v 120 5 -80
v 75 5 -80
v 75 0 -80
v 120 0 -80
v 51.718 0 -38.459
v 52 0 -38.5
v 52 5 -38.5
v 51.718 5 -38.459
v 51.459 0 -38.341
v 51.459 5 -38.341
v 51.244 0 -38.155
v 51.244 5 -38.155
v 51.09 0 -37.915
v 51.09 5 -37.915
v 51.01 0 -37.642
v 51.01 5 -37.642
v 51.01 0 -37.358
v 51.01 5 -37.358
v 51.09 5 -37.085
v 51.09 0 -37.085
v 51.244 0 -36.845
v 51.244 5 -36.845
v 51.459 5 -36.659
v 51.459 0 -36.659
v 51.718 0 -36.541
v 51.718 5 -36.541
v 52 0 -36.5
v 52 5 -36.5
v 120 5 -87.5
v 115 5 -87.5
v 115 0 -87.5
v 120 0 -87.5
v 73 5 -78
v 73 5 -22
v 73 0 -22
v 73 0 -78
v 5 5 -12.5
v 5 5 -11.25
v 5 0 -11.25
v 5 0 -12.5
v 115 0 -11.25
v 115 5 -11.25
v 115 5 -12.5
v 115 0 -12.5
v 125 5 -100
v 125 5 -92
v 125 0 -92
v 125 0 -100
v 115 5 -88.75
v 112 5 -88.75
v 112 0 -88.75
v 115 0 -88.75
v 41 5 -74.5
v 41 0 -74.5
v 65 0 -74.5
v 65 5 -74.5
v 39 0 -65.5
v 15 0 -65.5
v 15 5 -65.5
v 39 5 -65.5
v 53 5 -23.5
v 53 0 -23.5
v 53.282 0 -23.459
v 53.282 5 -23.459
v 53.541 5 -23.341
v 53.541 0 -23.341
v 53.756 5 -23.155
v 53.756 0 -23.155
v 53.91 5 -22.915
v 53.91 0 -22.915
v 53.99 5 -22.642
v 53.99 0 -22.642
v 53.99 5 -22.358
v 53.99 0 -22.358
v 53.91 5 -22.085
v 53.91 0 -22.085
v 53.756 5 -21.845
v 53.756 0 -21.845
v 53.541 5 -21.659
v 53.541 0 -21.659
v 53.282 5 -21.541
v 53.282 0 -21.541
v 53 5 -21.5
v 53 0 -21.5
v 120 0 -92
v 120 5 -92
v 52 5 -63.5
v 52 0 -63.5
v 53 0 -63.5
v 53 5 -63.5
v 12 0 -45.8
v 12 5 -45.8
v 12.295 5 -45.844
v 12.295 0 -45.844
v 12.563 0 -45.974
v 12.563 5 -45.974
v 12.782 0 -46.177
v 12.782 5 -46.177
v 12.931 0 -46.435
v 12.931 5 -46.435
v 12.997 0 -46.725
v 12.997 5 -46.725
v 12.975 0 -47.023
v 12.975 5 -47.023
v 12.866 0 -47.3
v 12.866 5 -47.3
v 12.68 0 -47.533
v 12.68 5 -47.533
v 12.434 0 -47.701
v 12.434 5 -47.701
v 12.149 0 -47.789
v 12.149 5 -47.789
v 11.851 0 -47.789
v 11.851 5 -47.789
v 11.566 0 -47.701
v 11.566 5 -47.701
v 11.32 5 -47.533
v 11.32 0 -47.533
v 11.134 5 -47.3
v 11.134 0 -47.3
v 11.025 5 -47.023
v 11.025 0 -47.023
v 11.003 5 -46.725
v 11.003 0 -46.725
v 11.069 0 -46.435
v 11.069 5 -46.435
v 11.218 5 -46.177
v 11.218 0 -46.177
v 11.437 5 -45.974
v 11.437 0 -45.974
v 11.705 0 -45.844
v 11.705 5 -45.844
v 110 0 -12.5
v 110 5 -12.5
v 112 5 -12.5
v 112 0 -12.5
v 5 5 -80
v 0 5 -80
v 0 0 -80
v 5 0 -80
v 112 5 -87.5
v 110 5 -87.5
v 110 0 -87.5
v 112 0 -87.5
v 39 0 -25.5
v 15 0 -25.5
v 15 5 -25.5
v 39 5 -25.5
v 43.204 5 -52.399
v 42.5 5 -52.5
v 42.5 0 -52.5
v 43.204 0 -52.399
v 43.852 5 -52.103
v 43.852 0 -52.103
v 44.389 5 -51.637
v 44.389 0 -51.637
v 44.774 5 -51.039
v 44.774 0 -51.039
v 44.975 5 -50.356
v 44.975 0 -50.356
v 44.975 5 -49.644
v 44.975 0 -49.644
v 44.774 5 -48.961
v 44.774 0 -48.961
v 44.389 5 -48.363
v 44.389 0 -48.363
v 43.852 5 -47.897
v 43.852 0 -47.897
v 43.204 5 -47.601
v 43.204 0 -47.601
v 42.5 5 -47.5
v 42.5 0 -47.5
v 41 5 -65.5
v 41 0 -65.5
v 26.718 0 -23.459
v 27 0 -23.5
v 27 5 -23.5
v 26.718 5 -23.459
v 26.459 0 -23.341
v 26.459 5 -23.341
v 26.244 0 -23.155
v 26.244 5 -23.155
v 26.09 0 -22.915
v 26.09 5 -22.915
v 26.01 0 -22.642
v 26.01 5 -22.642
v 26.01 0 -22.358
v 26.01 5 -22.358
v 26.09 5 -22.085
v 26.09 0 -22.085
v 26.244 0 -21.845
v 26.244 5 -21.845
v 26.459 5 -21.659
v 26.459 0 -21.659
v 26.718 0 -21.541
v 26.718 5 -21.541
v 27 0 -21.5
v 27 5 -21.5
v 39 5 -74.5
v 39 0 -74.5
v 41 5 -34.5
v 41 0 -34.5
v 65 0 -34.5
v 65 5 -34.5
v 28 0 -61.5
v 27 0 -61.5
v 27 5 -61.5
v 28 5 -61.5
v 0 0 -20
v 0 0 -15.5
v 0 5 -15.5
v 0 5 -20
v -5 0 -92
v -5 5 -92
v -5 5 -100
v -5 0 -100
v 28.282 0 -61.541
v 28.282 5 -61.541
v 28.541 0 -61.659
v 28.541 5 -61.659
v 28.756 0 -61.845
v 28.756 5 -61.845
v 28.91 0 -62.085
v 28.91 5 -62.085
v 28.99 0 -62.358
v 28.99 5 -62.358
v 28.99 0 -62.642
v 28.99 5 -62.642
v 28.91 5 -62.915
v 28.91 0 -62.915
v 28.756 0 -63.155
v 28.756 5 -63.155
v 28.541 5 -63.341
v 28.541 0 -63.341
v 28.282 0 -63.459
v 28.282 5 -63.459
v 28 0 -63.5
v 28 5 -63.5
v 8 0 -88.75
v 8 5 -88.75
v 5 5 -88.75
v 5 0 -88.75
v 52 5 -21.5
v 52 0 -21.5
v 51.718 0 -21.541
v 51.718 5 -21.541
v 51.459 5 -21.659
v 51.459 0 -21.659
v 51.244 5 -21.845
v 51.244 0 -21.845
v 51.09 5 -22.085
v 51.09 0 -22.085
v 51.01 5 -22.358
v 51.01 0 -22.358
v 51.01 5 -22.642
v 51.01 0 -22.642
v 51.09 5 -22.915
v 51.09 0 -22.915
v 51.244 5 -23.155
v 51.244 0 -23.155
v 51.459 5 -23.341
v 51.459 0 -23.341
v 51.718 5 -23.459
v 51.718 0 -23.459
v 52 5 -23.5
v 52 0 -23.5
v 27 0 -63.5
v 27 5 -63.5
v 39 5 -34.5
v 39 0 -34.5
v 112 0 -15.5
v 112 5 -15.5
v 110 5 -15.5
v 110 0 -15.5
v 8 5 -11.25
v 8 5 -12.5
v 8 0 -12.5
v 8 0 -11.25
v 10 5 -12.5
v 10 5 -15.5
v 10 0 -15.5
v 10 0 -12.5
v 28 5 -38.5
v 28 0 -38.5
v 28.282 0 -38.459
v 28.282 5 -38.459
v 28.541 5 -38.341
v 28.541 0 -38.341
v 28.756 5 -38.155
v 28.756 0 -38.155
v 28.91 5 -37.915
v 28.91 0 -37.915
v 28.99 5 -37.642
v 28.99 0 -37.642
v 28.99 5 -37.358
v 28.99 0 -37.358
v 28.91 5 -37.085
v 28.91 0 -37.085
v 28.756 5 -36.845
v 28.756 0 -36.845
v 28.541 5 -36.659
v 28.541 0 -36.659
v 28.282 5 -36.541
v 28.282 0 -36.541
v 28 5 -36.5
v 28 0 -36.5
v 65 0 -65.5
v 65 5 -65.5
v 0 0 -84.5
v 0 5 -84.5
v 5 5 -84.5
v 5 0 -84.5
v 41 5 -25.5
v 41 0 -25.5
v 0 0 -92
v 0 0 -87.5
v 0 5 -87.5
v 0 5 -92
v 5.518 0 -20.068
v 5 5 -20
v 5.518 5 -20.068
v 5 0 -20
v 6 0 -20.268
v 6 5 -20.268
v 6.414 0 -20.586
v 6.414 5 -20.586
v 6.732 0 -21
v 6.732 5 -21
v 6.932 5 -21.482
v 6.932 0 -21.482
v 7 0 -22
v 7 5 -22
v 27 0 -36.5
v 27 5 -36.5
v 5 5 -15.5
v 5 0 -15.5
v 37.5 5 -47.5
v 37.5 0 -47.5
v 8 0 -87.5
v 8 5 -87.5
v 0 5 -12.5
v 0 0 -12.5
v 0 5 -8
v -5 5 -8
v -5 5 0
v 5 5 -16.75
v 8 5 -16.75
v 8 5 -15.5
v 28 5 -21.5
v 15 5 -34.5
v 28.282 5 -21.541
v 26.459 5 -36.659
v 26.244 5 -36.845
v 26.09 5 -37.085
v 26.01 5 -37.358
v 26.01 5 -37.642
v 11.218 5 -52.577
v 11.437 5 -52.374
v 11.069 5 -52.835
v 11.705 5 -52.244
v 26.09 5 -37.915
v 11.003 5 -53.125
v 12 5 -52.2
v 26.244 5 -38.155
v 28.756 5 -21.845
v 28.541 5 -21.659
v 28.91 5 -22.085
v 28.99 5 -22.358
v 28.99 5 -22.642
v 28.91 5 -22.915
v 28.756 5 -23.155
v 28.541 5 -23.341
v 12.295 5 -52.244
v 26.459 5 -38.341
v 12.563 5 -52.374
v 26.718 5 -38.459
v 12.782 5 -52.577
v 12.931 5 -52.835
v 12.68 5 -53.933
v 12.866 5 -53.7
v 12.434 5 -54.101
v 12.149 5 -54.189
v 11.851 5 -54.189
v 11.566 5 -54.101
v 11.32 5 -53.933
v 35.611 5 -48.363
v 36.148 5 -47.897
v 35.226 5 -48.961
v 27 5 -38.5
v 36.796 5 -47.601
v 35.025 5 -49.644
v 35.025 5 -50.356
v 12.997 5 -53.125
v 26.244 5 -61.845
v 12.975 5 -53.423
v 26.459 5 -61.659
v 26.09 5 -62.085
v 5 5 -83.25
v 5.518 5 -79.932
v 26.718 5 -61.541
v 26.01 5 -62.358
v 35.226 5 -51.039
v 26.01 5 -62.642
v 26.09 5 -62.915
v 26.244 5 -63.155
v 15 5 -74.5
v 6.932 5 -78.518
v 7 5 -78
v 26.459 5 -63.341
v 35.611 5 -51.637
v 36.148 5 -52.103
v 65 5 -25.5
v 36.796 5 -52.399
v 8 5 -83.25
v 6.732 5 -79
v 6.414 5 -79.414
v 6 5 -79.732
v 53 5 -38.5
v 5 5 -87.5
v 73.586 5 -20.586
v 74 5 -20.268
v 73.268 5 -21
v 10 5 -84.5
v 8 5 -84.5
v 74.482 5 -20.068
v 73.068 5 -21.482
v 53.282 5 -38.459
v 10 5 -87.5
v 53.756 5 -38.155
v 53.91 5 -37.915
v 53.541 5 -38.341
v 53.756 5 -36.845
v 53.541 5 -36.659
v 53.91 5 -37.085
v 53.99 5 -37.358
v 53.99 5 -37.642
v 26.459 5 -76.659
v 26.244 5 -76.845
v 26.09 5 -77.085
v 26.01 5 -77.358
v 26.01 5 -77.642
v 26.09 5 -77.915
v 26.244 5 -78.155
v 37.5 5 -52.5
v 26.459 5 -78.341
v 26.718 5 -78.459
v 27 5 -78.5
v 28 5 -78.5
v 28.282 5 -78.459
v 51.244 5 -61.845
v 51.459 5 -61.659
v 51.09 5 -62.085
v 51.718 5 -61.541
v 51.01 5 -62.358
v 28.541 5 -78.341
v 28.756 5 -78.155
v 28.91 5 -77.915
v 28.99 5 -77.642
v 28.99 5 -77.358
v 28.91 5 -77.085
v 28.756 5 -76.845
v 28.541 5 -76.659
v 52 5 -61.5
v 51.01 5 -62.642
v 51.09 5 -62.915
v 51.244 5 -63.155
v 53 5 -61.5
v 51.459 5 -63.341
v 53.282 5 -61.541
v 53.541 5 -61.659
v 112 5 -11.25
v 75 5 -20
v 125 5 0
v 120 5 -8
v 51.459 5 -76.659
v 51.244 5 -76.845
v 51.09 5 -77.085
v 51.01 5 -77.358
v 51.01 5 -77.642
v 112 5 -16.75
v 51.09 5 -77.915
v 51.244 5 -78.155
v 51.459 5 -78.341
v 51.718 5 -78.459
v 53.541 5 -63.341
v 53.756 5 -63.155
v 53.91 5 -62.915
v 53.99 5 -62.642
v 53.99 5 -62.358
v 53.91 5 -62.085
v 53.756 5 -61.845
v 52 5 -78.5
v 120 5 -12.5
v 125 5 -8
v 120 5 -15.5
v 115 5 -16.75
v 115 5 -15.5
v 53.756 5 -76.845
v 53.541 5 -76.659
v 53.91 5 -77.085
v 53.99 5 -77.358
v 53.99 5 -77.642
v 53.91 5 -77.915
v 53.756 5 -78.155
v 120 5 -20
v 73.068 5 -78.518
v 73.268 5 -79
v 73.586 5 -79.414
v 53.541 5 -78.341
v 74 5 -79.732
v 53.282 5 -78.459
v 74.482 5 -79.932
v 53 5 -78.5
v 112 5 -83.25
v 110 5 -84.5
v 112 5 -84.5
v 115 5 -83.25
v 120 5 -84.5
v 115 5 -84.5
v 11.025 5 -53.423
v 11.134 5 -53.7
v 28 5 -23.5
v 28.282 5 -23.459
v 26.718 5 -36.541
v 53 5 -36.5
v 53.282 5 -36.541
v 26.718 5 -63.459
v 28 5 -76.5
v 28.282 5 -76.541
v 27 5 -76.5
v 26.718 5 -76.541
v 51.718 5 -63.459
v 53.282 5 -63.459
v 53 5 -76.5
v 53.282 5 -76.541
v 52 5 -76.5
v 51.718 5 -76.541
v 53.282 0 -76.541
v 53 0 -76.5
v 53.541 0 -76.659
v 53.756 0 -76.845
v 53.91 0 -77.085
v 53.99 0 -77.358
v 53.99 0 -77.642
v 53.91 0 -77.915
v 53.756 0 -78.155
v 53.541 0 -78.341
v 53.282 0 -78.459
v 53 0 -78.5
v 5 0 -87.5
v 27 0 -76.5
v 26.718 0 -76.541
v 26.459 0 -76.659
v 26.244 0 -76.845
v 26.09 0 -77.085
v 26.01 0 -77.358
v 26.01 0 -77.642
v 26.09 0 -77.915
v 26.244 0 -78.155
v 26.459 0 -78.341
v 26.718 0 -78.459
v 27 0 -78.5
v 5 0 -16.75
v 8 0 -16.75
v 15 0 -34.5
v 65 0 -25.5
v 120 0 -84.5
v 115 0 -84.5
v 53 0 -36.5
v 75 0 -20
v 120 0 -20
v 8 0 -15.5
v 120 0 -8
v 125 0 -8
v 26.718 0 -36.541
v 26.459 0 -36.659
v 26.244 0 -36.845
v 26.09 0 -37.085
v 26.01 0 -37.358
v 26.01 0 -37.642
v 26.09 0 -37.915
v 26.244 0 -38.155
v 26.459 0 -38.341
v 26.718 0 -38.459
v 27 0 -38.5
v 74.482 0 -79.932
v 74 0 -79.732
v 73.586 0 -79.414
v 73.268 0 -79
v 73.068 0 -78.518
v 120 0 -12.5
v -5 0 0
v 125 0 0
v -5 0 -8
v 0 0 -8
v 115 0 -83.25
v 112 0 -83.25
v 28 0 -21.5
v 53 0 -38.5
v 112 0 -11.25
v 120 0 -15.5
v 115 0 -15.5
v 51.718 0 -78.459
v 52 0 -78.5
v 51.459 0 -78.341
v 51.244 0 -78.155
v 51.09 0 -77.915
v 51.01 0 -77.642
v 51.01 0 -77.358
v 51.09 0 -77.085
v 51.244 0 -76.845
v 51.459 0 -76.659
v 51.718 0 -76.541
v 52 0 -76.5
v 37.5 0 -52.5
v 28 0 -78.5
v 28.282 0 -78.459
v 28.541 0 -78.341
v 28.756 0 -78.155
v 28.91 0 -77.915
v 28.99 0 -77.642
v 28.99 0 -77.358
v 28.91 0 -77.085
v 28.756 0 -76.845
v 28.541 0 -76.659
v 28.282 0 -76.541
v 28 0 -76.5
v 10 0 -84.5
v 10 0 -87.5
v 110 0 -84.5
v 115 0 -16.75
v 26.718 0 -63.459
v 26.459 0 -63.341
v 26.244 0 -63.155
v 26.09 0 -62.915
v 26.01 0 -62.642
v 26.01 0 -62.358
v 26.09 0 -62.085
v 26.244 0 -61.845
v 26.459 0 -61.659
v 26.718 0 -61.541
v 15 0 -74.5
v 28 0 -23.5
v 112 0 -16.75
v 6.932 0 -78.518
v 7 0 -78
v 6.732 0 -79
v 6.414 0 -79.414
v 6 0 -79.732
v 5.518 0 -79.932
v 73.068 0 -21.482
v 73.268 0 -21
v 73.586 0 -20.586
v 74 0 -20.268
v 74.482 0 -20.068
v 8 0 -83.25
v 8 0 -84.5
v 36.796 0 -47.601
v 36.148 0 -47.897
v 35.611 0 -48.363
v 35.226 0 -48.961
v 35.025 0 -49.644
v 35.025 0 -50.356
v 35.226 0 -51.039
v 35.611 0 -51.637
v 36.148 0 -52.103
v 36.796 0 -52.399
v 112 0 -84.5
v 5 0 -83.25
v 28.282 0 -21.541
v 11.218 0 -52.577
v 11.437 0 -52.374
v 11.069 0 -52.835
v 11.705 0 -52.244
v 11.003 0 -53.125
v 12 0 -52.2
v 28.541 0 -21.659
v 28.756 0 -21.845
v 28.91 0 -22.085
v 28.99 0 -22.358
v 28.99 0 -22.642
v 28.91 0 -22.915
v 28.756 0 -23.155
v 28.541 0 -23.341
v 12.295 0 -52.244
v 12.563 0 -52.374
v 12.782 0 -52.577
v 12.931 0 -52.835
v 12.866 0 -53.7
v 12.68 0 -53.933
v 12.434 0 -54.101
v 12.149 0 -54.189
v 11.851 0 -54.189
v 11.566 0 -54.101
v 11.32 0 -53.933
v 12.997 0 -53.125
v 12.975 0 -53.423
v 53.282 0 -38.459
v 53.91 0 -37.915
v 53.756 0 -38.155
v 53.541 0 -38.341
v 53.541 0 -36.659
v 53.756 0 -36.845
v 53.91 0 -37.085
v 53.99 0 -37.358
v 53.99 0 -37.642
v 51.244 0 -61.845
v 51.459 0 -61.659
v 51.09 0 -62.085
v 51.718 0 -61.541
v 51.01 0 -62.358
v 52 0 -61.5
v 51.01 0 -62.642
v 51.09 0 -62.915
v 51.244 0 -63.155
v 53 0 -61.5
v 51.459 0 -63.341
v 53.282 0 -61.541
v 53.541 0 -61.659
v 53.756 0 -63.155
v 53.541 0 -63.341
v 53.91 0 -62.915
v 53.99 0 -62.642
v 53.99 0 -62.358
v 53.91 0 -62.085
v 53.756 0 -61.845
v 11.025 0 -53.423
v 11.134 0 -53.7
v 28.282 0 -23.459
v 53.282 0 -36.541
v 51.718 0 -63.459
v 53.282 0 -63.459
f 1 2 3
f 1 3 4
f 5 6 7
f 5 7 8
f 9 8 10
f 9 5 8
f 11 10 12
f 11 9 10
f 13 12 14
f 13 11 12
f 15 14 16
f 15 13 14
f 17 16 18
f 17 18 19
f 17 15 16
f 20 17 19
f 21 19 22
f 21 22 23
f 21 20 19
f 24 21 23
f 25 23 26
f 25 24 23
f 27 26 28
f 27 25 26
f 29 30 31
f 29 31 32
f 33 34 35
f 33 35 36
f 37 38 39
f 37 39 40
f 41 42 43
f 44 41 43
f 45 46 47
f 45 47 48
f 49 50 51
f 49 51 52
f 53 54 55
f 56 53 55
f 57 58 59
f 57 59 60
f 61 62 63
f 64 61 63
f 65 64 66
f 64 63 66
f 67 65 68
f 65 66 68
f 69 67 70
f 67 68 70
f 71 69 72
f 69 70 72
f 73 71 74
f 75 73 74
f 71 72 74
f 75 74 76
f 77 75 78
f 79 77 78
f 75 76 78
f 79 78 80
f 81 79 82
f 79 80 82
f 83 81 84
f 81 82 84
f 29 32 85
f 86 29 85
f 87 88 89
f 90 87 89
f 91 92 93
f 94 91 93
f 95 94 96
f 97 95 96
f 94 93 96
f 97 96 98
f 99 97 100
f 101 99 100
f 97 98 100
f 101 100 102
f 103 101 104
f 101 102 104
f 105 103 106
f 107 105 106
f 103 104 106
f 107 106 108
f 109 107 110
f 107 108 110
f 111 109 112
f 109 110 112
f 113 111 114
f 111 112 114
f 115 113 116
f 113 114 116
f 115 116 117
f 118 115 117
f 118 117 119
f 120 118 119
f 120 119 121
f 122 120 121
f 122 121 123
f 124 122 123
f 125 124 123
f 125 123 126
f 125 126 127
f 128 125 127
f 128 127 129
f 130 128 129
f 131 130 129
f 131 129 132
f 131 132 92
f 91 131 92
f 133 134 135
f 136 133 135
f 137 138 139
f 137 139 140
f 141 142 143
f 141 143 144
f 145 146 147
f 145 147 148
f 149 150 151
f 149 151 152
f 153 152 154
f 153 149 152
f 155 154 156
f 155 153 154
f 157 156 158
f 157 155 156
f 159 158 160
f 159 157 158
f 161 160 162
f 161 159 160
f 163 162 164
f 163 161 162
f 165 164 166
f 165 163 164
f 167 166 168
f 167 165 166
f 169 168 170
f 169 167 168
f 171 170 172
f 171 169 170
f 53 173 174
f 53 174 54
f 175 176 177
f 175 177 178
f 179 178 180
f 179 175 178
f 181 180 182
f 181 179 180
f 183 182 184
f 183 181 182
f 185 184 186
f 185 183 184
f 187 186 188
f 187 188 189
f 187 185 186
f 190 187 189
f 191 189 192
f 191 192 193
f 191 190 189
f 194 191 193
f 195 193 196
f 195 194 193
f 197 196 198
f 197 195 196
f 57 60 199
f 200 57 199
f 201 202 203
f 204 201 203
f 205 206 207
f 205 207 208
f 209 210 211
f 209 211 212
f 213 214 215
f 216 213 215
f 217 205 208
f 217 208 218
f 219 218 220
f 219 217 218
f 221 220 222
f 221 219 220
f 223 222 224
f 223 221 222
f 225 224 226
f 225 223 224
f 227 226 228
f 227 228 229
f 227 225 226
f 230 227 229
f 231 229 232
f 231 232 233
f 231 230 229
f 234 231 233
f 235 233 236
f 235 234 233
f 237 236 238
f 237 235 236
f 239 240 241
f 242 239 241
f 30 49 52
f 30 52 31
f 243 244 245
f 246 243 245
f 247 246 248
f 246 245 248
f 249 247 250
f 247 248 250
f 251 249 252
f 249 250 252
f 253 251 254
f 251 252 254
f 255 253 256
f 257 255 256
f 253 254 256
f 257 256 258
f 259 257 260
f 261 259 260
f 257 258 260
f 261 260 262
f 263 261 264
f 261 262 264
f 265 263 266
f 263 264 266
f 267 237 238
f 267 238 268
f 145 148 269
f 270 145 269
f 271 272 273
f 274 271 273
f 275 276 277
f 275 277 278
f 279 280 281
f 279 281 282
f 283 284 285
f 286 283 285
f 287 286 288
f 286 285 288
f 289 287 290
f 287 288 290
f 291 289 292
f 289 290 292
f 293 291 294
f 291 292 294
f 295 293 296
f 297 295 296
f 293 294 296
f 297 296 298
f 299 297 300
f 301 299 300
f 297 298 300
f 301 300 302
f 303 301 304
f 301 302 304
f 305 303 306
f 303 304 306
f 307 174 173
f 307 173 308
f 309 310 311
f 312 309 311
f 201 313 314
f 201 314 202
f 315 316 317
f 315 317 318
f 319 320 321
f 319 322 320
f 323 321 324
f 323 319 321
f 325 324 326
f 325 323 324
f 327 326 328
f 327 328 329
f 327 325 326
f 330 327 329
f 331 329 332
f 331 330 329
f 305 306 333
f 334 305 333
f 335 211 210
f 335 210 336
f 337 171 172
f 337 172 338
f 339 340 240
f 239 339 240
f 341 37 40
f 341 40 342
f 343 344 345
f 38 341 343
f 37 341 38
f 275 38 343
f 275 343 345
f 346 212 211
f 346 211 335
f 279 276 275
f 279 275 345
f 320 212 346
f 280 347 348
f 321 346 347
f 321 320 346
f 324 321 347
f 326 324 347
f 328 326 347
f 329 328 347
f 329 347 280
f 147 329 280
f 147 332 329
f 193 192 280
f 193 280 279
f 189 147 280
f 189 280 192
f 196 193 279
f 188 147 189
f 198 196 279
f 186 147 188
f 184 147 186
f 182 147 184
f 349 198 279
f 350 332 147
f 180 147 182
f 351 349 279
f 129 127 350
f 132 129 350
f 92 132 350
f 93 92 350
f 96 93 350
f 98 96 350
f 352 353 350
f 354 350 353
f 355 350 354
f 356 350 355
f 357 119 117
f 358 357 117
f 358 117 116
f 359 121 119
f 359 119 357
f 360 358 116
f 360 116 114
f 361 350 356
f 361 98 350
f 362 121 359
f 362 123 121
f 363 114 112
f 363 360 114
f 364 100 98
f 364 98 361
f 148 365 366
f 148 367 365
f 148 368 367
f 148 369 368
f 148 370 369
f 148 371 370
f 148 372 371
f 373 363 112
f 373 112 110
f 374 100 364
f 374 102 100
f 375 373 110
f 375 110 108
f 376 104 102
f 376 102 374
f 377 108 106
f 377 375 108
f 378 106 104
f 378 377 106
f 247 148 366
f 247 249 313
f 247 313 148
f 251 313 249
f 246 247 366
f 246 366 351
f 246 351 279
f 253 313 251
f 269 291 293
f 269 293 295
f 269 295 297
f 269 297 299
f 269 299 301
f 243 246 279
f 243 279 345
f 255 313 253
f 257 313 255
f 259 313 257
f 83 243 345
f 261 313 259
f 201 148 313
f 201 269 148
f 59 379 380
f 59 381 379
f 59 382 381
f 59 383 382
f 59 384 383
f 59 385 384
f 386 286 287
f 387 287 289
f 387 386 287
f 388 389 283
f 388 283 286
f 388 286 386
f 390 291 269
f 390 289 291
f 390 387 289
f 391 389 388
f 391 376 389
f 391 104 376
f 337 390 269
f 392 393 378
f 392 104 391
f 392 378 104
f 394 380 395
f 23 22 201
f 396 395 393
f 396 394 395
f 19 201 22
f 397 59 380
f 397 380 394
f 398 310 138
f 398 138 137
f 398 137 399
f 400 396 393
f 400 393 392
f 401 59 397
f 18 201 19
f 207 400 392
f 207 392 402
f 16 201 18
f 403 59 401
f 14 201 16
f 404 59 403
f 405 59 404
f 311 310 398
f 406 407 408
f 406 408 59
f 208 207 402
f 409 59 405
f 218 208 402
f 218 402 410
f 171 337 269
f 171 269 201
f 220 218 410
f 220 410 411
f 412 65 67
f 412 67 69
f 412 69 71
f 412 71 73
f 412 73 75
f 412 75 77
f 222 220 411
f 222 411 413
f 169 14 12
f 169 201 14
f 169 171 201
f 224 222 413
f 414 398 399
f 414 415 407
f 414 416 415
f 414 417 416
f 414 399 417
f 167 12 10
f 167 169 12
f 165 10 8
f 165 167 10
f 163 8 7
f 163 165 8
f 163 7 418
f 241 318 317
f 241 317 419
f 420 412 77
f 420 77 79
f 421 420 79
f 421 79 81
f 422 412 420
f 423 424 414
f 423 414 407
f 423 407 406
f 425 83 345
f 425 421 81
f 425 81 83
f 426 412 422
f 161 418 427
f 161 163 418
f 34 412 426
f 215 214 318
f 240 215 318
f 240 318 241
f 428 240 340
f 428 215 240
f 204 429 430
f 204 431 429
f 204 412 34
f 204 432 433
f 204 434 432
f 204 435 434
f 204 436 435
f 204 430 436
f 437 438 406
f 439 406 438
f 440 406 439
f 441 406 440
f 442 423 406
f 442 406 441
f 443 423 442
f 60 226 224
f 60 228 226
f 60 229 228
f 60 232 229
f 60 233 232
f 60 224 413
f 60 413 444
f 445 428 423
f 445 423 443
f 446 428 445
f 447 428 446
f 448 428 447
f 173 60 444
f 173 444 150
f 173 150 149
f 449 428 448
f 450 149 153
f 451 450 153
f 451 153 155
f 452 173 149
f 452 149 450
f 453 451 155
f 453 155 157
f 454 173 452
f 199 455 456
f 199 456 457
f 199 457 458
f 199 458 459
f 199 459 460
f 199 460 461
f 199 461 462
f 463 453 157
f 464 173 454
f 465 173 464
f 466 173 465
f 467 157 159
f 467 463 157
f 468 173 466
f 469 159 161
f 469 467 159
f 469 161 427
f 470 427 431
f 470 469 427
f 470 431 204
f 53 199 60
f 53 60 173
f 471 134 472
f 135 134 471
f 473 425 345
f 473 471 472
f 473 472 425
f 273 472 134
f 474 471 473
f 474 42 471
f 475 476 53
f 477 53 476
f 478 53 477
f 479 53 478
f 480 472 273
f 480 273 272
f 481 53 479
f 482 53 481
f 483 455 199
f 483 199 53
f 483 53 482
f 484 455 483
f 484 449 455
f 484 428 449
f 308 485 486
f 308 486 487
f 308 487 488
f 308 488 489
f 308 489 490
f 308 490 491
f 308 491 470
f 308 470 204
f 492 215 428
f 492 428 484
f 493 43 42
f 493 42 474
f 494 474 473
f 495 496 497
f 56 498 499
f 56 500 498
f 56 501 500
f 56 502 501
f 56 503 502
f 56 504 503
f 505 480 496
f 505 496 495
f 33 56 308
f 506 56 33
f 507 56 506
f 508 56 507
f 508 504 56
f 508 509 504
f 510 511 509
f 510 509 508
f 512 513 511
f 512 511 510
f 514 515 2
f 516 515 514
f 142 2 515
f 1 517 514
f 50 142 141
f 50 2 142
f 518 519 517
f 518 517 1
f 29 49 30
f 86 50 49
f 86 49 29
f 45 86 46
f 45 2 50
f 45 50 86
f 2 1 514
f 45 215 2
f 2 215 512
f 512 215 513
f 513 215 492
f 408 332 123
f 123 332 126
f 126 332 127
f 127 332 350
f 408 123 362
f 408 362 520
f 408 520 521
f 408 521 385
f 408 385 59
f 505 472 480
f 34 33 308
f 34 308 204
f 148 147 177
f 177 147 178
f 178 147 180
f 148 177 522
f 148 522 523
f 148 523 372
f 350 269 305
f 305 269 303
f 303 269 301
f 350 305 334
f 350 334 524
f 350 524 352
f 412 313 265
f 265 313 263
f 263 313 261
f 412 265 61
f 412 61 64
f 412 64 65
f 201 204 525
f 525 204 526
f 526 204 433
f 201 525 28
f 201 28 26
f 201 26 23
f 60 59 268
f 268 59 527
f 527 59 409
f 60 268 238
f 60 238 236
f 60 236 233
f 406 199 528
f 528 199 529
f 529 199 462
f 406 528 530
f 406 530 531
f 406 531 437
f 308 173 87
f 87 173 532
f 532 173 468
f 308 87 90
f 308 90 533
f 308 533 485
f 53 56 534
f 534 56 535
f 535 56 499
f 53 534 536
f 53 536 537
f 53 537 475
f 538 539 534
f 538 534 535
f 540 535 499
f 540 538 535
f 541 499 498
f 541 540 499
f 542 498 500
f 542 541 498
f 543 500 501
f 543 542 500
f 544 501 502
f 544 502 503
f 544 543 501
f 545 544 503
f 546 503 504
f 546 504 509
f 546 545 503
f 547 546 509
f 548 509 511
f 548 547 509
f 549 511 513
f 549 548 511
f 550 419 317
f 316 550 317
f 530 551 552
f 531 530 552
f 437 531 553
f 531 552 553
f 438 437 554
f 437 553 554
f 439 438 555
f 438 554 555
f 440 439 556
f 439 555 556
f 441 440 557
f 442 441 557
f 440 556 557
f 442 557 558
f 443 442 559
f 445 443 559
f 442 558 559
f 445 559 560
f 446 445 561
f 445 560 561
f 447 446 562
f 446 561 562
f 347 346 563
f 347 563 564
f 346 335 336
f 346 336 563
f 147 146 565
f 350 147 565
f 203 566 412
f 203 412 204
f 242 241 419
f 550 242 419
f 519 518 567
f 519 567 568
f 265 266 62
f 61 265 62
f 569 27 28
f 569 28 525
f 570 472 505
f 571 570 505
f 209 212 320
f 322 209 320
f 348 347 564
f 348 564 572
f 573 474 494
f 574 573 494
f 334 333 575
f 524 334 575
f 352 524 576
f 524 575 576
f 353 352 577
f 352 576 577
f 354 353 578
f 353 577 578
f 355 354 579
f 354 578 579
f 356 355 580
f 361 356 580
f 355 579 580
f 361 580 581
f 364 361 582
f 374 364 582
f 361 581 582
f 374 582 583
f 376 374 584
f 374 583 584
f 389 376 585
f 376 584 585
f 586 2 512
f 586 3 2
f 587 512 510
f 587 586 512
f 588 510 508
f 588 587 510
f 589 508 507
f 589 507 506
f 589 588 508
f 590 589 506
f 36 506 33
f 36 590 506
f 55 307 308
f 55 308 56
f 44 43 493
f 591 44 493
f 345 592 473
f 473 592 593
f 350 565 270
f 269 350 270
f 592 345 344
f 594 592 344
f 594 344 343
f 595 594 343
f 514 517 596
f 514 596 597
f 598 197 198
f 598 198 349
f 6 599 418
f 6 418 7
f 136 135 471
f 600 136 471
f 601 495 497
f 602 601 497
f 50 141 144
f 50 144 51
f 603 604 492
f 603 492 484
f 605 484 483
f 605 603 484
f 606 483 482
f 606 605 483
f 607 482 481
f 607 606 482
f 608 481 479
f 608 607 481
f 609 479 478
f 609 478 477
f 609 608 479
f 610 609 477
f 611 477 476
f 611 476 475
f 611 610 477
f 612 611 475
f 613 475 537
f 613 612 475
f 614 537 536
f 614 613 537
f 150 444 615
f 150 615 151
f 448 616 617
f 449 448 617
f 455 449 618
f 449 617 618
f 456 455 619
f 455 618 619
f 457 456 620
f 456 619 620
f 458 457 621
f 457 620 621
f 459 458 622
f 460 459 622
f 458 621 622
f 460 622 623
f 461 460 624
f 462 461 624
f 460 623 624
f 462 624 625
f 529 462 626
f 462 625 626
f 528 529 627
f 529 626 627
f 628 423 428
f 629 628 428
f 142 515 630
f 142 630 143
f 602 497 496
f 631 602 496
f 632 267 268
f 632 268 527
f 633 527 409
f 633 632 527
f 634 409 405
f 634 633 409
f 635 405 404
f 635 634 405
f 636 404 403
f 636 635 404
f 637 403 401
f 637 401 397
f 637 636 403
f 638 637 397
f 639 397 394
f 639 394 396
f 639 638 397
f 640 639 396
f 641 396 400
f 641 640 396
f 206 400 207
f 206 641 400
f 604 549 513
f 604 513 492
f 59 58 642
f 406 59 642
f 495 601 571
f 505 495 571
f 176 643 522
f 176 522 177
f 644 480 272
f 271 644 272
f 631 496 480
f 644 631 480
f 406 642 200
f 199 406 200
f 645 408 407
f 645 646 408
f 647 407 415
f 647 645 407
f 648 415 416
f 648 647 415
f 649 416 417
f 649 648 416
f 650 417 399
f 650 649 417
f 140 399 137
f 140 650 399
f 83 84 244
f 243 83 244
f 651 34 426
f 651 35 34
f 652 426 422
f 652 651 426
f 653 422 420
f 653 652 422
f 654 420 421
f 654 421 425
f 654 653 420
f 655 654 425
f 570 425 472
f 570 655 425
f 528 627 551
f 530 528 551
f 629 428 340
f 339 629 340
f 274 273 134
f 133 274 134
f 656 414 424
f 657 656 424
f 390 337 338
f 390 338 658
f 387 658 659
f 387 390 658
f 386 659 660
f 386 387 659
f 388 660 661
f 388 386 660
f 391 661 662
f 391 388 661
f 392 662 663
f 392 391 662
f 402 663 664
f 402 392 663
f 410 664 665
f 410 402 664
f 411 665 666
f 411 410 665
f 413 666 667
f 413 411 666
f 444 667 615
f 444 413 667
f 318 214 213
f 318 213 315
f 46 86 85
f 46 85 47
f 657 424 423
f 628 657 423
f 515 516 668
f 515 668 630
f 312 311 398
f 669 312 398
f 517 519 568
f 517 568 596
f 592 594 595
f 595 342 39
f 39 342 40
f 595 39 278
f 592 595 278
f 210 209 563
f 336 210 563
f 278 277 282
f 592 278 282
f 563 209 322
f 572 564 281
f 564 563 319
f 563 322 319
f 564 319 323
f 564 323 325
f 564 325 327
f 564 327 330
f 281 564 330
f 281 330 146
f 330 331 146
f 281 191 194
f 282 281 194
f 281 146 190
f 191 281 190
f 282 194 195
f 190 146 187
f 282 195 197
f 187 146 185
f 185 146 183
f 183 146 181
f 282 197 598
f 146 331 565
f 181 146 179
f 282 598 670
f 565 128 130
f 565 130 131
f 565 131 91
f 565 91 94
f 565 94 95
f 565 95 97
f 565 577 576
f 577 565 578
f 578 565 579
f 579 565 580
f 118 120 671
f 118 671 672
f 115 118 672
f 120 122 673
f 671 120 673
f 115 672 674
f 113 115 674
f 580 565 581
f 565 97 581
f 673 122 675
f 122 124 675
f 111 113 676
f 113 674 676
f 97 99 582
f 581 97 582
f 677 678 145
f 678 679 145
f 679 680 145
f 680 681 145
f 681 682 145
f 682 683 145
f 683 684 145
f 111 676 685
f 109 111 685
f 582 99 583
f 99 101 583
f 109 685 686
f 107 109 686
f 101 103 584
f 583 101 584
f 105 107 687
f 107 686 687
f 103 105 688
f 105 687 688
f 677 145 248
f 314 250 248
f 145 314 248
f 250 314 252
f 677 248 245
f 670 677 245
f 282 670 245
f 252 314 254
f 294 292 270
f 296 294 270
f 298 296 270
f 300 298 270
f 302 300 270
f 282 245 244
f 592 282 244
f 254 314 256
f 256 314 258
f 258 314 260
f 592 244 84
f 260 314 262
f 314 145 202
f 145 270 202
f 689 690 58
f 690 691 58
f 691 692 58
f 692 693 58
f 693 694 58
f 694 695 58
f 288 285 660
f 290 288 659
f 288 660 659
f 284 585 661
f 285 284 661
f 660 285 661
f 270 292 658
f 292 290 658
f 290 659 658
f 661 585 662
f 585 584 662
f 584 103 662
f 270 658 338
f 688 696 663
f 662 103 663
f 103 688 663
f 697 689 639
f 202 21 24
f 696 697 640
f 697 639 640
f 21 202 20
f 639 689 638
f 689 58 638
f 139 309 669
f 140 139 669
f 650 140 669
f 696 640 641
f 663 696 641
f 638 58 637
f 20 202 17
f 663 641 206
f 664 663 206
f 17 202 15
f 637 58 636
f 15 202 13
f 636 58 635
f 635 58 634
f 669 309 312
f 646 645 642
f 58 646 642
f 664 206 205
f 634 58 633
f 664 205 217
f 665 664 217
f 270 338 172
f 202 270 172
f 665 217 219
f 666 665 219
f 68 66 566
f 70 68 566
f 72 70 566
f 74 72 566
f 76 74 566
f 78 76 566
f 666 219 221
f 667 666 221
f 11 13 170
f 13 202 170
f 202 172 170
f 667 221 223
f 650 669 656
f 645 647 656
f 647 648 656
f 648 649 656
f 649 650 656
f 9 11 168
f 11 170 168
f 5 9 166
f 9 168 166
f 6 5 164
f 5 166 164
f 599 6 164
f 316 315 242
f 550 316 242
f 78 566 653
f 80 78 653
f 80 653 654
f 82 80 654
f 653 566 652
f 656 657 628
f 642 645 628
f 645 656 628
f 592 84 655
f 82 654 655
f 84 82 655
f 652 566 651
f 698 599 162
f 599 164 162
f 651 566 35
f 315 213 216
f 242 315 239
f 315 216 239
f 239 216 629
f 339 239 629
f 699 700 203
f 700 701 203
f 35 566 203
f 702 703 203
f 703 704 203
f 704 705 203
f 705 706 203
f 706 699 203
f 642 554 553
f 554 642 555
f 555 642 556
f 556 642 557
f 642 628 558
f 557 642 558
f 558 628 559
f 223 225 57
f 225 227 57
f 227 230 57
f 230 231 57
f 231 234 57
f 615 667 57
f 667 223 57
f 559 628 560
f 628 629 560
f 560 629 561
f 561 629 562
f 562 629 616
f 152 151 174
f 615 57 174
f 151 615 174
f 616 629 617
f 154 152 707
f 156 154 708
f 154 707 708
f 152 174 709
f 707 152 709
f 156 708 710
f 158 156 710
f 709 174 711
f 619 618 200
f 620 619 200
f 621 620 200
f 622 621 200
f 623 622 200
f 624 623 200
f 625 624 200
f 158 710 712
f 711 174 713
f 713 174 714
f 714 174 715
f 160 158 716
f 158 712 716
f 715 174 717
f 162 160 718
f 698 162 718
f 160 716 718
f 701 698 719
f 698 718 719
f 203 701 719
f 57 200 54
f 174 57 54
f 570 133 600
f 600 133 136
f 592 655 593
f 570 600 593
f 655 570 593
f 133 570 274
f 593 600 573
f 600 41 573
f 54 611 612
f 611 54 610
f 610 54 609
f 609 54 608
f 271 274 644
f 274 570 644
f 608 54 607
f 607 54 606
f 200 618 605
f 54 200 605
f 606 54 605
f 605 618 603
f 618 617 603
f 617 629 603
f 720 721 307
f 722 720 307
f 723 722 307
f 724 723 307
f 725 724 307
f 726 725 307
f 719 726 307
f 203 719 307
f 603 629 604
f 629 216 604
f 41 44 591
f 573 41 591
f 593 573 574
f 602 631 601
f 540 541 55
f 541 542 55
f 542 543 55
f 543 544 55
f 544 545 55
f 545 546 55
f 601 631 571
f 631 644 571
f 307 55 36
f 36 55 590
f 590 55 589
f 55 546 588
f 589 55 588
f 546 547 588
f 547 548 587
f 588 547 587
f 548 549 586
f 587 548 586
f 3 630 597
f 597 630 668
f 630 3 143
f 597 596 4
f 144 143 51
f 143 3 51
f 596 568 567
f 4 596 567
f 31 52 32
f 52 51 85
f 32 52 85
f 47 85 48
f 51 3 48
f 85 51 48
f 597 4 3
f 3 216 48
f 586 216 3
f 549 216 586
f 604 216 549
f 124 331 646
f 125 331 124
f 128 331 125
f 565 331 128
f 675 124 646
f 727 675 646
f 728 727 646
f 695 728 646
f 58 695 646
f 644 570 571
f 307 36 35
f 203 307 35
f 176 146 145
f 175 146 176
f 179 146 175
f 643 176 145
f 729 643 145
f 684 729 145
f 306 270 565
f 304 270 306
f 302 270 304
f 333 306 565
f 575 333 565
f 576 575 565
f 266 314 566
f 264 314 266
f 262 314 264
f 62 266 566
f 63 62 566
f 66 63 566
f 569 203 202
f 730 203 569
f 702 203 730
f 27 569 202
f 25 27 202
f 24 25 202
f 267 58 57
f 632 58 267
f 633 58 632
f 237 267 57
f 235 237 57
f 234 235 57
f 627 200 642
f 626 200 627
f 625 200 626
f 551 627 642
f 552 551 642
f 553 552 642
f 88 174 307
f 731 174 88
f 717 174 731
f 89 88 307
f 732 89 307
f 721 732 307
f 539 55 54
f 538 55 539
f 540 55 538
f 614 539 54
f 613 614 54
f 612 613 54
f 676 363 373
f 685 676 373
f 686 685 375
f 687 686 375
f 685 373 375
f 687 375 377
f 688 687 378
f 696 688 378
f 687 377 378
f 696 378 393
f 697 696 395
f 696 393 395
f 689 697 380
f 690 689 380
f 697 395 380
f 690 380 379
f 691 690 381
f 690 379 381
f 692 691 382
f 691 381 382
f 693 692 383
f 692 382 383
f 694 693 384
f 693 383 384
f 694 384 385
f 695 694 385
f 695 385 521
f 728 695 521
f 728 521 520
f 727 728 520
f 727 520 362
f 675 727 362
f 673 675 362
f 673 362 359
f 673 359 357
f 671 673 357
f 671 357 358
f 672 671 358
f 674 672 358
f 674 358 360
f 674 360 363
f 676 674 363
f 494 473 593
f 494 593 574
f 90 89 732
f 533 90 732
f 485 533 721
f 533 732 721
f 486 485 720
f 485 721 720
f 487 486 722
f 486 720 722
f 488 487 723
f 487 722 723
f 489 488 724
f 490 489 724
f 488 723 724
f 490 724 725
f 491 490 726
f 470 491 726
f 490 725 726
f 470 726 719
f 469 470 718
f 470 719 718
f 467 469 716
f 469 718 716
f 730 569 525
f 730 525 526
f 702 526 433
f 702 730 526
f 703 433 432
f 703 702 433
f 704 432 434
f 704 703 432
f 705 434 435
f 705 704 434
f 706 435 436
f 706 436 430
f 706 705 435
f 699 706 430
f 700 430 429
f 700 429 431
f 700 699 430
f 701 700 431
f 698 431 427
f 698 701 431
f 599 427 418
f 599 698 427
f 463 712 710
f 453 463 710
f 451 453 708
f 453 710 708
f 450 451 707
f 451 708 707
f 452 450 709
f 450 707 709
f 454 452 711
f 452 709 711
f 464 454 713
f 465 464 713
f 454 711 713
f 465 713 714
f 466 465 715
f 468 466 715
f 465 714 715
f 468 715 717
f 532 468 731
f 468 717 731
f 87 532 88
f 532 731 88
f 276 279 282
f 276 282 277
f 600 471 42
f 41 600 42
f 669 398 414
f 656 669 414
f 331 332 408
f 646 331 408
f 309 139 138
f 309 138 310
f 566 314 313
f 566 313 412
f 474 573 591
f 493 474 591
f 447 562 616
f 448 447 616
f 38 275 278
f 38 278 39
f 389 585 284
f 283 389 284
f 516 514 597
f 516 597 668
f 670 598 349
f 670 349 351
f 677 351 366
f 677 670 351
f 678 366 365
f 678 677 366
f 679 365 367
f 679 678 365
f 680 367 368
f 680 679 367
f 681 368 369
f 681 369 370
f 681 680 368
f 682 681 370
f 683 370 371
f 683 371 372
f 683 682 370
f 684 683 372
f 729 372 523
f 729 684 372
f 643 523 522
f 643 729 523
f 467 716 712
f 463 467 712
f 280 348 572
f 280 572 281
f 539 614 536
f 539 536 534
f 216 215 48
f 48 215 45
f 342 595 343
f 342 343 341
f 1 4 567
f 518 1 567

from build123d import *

# Parameters (mm, degrees)
SKETCH1_W           = 120
SKETCH1_H           = 100
SKETCH1_W_2         = 50
SKETCH1_H_2         = 9
BOSS_EXTRUDE1_DEPTH = 5
SKETCH2_W           = 5
SKETCH2_H           = 8
BOSS_EXTRUDE2_DEPTH = 5
SKETCH3_W           = 47
SKETCH3_H           = 60
SKETCH3_W_2         = 7
CUT_EXTRUDE1_DEPTH  = 161.15617378
FILLET1_R           = 2
SKETCH4_R           = 1
CUT_EXTRUDE2_DEPTH  = 161.15617378
CUT_EXTRUDE3_DEPTH  = 161.15617378
SKETCH6_W           = 2
SKETCH6_H           = 9
BOSS_EXTRUDE3_DEPTH = 5


with BuildPart() as part:
    # Sketch1 → Boss-Extrude1 (new body)
    with BuildSketch(Plane(origin=(0, 0, 0), x_dir=(1, 0, 0), z_dir=(0, 1, 0))):
        with Locations((60, 50)):
            Rectangle(SKETCH1_W, SKETCH1_H)
        with BuildLine():
            Line((27, 78.5), (28, 78.5))
            ThreePointArc((28, 78.5), (29, 77.5), (28, 76.5))
            Line((28, 76.5), (27, 76.5))
            ThreePointArc((27, 76.5), (26, 77.5), (27, 78.5))
        make_face(mode=Mode.SUBTRACT)
        with Locations((40, 70)):
            Rectangle(SKETCH1_W_2, SKETCH1_H_2, mode=Mode.SUBTRACT)
        with BuildLine():
            Line((53, 78.5), (52, 78.5))
            ThreePointArc((52, 78.5), (51, 77.5), (52, 76.5))
            Line((52, 76.5), (53, 76.5))
            ThreePointArc((53, 76.5), (54, 77.5), (53, 78.5))
        make_face(mode=Mode.SUBTRACT)
        with BuildLine():
            Line((27, 61.5), (28, 61.5))
            ThreePointArc((28, 61.5), (29, 62.5), (28, 63.5))
            Line((28, 63.5), (27, 63.5))
            ThreePointArc((27, 63.5), (26, 62.5), (27, 61.5))
        make_face(mode=Mode.SUBTRACT)
        with BuildLine():
            Line((53, 61.5), (52, 61.5))
            ThreePointArc((52, 61.5), (51, 62.5), (52, 63.5))
            Line((52, 63.5), (53, 63.5))
            ThreePointArc((53, 63.5), (54, 62.5), (53, 61.5))
        make_face(mode=Mode.SUBTRACT)
        with BuildLine():
            Line((27, 21.5), (28, 21.5))
            ThreePointArc((28, 21.5), (29, 22.5), (28, 23.5))
            Line((28, 23.5), (27, 23.5))
            ThreePointArc((27, 23.5), (26, 22.5), (27, 21.5))
        make_face(mode=Mode.SUBTRACT)
        with BuildLine():
            Line((53, 21.5), (52, 21.5))
            ThreePointArc((52, 21.5), (51, 22.5), (52, 23.5))
            Line((52, 23.5), (53, 23.5))
            ThreePointArc((53, 23.5), (54, 22.5), (53, 21.5))
        make_face(mode=Mode.SUBTRACT)
        with BuildLine():
            Line((27, 38.5), (28, 38.5))
            ThreePointArc((28, 38.5), (29, 37.5), (28, 36.5))
            Line((28, 36.5), (27, 36.5))
            ThreePointArc((27, 36.5), (26, 37.5), (27, 38.5))
        make_face(mode=Mode.SUBTRACT)
        with BuildLine():
            Line((53, 38.5), (52, 38.5))
            ThreePointArc((52, 38.5), (51, 37.5), (52, 36.5))
            Line((52, 36.5), (53, 36.5))
            ThreePointArc((53, 36.5), (54, 37.5), (53, 38.5))
        make_face(mode=Mode.SUBTRACT)
        with Locations((40, 30)):
            Rectangle(SKETCH1_W_2, SKETCH1_H_2, mode=Mode.SUBTRACT)
    extrude(amount=BOSS_EXTRUDE1_DEPTH)

    # Sketch2 → Boss-Extrude2 (add)
    with BuildSketch(Plane(origin=(0, 5, 0), x_dir=(1, 0, 0), z_dir=(0, 1, 0))):
        with Locations((122.5, 96)):
            Rectangle(SKETCH2_W, SKETCH2_H)
        with Locations((122.5, 4)):
            Rectangle(SKETCH2_W, SKETCH2_H)
        with Locations((-2.5, 4)):
            Rectangle(SKETCH2_W, SKETCH2_H)
        with Locations((-2.5, 96)):
            Rectangle(SKETCH2_W, SKETCH2_H)
    extrude(amount=-BOSS_EXTRUDE2_DEPTH)

    # Sketch3 → Cut-Extrude1 (cut, through all)
    with BuildSketch(Plane(origin=(0, 5, 0), x_dir=(1, 0, 0), z_dir=(0, 1, 0))):
        with Locations((96.5, 50)):
            Rectangle(SKETCH3_W, SKETCH3_H)
        with Locations((3.5, 50)):
            Rectangle(SKETCH3_W_2, SKETCH3_H)
    extrude(amount=-CUT_EXTRUDE1_DEPTH, mode=Mode.SUBTRACT)

    # Fillet1
    fillet1_edges = [part.edges().sort_by_distance(p)[0] for p in [
        (73, 2.5, -20),
        (73, 2.5, -80),
        (7, 2.5, -80),
        (7, 2.5, -20),
    ]]
    fillet(fillet1_edges, radius=FILLET1_R)

    # Sketch4 → Cut-Extrude2 (cut, through all)
    with BuildSketch(Plane(origin=(0, 5, 0), x_dir=(1, 0, 0), z_dir=(0, 1, 0))):
        with Locations(Location((12, 53.2, 0), (0, 0, 270))):
            Circle(SKETCH4_R)
        with Locations(Location((12, 46.8, 0), (0, 0, 270))):
            Circle(SKETCH4_R)
        with BuildLine():
            Line((37.5, 52.5), (42.5, 52.5))
            ThreePointArc((42.5, 52.5), (45, 50), (42.5, 47.5))
            Line((42.5, 47.5), (37.5, 47.5))
            ThreePointArc((37.5, 47.5), (35, 50), (37.5, 52.5))
        make_face()
    extrude(amount=-CUT_EXTRUDE2_DEPTH, mode=Mode.SUBTRACT)

    # Sketch5 → Cut-Extrude3 (cut, through all)
    with BuildSketch(Plane(origin=(0, 5, 0), x_dir=(1, 0, 0), z_dir=(0, 1, 0))):
        Polygon((120, 15.5), (115, 15.5), (115, 16.75), (112, 16.75), (112, 15.5), (110, 15.5), (110, 12.5), (112, 12.5), (112, 11.25), (115, 11.25), (115, 12.5), (120, 12.5), align=None)
        Polygon((0, 12.5), (0, 15.5), (5, 15.5), (5, 16.75), (8, 16.75), (8, 15.5), (10, 15.5), (10, 12.5), (8, 12.5), (8, 11.25), (5, 11.25), (5, 12.5), align=None)
        Polygon((0, 84.5), (5, 84.5), (5, 83.25), (8, 83.25), (8, 84.5), (10, 84.5), (10, 87.5), (8, 87.5), (8, 88.75), (5, 88.75), (5, 87.5), (0, 87.5), align=None)
        Polygon((120, 87.5), (120, 84.5), (115, 84.5), (115, 83.25), (112, 83.25), (112, 84.5), (110, 84.5), (110, 87.5), (112, 87.5), (112, 88.75), (115, 88.75), (115, 87.5), align=None)
    extrude(amount=-CUT_EXTRUDE3_DEPTH, mode=Mode.SUBTRACT)

    # Sketch6 → Boss-Extrude3 (add)
    with BuildSketch(Plane(origin=(0, 5, 0), x_dir=(1, 0, 0), z_dir=(0, 1, 0))):
        with Locations((40, 70)):
            Rectangle(SKETCH6_W, SKETCH6_H)
        with Locations((40, 30)):
            Rectangle(SKETCH6_W, SKETCH6_H)
    extrude(amount=-BOSS_EXTRUDE3_DEPTH)


solid = part.part
